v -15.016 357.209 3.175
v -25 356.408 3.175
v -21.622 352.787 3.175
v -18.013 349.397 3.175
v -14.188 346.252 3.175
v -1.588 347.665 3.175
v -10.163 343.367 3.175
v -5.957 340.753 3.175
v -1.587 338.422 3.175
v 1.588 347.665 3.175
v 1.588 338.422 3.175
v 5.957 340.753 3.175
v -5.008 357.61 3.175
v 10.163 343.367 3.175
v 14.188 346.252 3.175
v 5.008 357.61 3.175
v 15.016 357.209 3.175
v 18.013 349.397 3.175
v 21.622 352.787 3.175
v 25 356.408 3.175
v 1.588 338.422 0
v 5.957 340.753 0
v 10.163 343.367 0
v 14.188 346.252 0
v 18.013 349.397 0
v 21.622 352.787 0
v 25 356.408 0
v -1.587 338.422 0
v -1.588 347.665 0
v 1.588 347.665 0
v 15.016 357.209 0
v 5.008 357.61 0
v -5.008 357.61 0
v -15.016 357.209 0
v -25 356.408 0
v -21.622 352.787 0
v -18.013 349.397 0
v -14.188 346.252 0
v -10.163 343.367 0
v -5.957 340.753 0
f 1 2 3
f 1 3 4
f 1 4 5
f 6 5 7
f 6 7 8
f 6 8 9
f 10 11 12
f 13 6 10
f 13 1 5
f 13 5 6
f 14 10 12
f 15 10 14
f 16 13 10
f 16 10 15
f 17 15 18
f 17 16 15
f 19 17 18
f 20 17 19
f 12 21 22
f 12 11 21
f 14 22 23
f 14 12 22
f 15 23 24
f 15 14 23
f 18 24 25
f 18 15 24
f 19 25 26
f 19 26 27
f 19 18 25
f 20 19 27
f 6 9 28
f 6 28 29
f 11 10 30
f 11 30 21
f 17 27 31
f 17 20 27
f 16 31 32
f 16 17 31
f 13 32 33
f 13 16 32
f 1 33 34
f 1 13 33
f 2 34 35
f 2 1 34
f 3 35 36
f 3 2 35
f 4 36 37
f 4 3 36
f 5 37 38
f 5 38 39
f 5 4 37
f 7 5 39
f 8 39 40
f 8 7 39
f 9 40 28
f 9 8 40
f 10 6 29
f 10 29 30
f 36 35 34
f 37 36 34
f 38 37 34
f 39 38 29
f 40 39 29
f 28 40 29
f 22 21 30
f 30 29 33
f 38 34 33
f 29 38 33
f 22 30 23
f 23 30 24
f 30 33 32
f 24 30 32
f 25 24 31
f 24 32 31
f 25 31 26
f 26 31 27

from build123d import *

# Parameters (mm, degrees)
BOSS_EXTRUDE1_DEPTH = 1.5875


with BuildPart() as part:
    # Sketch2 → Boss-Extrude1 (new, symmetric)
    with BuildSketch(Plane.XY.offset(1.5875)):
        with BuildLine():
            ThreePointArc((-25, 356.408412891), (-14.187505021, 346.252036042), (-1.5875, 338.422482296))
            Line((-1.5875, 338.422482296), (-1.5875, 347.664977579))
            ThreePointArc((-1.5875, 347.664977579), (0, 349.252477579), (1.5875, 347.664977579))
            Line((1.5875, 347.664977579), (1.5875, 338.422482296))
            ThreePointArc((1.5875, 338.422482296), (14.187505021, 346.252036042), (25, 356.408412891))
            ThreePointArc((25, 356.408412891), (0, 357.65994376), (-25, 356.408412891))
        make_face()
        with BuildLine():
            Line((-1.5875, 347.664977579), (1.5875, 347.664977579))
            ThreePointArc((1.5875, 347.664977579), (0, 349.252477579), (-1.5875, 347.664977579))
        make_face()
    extrude(amount=BOSS_EXTRUDE1_DEPTH, both=True)


solid = part.part
